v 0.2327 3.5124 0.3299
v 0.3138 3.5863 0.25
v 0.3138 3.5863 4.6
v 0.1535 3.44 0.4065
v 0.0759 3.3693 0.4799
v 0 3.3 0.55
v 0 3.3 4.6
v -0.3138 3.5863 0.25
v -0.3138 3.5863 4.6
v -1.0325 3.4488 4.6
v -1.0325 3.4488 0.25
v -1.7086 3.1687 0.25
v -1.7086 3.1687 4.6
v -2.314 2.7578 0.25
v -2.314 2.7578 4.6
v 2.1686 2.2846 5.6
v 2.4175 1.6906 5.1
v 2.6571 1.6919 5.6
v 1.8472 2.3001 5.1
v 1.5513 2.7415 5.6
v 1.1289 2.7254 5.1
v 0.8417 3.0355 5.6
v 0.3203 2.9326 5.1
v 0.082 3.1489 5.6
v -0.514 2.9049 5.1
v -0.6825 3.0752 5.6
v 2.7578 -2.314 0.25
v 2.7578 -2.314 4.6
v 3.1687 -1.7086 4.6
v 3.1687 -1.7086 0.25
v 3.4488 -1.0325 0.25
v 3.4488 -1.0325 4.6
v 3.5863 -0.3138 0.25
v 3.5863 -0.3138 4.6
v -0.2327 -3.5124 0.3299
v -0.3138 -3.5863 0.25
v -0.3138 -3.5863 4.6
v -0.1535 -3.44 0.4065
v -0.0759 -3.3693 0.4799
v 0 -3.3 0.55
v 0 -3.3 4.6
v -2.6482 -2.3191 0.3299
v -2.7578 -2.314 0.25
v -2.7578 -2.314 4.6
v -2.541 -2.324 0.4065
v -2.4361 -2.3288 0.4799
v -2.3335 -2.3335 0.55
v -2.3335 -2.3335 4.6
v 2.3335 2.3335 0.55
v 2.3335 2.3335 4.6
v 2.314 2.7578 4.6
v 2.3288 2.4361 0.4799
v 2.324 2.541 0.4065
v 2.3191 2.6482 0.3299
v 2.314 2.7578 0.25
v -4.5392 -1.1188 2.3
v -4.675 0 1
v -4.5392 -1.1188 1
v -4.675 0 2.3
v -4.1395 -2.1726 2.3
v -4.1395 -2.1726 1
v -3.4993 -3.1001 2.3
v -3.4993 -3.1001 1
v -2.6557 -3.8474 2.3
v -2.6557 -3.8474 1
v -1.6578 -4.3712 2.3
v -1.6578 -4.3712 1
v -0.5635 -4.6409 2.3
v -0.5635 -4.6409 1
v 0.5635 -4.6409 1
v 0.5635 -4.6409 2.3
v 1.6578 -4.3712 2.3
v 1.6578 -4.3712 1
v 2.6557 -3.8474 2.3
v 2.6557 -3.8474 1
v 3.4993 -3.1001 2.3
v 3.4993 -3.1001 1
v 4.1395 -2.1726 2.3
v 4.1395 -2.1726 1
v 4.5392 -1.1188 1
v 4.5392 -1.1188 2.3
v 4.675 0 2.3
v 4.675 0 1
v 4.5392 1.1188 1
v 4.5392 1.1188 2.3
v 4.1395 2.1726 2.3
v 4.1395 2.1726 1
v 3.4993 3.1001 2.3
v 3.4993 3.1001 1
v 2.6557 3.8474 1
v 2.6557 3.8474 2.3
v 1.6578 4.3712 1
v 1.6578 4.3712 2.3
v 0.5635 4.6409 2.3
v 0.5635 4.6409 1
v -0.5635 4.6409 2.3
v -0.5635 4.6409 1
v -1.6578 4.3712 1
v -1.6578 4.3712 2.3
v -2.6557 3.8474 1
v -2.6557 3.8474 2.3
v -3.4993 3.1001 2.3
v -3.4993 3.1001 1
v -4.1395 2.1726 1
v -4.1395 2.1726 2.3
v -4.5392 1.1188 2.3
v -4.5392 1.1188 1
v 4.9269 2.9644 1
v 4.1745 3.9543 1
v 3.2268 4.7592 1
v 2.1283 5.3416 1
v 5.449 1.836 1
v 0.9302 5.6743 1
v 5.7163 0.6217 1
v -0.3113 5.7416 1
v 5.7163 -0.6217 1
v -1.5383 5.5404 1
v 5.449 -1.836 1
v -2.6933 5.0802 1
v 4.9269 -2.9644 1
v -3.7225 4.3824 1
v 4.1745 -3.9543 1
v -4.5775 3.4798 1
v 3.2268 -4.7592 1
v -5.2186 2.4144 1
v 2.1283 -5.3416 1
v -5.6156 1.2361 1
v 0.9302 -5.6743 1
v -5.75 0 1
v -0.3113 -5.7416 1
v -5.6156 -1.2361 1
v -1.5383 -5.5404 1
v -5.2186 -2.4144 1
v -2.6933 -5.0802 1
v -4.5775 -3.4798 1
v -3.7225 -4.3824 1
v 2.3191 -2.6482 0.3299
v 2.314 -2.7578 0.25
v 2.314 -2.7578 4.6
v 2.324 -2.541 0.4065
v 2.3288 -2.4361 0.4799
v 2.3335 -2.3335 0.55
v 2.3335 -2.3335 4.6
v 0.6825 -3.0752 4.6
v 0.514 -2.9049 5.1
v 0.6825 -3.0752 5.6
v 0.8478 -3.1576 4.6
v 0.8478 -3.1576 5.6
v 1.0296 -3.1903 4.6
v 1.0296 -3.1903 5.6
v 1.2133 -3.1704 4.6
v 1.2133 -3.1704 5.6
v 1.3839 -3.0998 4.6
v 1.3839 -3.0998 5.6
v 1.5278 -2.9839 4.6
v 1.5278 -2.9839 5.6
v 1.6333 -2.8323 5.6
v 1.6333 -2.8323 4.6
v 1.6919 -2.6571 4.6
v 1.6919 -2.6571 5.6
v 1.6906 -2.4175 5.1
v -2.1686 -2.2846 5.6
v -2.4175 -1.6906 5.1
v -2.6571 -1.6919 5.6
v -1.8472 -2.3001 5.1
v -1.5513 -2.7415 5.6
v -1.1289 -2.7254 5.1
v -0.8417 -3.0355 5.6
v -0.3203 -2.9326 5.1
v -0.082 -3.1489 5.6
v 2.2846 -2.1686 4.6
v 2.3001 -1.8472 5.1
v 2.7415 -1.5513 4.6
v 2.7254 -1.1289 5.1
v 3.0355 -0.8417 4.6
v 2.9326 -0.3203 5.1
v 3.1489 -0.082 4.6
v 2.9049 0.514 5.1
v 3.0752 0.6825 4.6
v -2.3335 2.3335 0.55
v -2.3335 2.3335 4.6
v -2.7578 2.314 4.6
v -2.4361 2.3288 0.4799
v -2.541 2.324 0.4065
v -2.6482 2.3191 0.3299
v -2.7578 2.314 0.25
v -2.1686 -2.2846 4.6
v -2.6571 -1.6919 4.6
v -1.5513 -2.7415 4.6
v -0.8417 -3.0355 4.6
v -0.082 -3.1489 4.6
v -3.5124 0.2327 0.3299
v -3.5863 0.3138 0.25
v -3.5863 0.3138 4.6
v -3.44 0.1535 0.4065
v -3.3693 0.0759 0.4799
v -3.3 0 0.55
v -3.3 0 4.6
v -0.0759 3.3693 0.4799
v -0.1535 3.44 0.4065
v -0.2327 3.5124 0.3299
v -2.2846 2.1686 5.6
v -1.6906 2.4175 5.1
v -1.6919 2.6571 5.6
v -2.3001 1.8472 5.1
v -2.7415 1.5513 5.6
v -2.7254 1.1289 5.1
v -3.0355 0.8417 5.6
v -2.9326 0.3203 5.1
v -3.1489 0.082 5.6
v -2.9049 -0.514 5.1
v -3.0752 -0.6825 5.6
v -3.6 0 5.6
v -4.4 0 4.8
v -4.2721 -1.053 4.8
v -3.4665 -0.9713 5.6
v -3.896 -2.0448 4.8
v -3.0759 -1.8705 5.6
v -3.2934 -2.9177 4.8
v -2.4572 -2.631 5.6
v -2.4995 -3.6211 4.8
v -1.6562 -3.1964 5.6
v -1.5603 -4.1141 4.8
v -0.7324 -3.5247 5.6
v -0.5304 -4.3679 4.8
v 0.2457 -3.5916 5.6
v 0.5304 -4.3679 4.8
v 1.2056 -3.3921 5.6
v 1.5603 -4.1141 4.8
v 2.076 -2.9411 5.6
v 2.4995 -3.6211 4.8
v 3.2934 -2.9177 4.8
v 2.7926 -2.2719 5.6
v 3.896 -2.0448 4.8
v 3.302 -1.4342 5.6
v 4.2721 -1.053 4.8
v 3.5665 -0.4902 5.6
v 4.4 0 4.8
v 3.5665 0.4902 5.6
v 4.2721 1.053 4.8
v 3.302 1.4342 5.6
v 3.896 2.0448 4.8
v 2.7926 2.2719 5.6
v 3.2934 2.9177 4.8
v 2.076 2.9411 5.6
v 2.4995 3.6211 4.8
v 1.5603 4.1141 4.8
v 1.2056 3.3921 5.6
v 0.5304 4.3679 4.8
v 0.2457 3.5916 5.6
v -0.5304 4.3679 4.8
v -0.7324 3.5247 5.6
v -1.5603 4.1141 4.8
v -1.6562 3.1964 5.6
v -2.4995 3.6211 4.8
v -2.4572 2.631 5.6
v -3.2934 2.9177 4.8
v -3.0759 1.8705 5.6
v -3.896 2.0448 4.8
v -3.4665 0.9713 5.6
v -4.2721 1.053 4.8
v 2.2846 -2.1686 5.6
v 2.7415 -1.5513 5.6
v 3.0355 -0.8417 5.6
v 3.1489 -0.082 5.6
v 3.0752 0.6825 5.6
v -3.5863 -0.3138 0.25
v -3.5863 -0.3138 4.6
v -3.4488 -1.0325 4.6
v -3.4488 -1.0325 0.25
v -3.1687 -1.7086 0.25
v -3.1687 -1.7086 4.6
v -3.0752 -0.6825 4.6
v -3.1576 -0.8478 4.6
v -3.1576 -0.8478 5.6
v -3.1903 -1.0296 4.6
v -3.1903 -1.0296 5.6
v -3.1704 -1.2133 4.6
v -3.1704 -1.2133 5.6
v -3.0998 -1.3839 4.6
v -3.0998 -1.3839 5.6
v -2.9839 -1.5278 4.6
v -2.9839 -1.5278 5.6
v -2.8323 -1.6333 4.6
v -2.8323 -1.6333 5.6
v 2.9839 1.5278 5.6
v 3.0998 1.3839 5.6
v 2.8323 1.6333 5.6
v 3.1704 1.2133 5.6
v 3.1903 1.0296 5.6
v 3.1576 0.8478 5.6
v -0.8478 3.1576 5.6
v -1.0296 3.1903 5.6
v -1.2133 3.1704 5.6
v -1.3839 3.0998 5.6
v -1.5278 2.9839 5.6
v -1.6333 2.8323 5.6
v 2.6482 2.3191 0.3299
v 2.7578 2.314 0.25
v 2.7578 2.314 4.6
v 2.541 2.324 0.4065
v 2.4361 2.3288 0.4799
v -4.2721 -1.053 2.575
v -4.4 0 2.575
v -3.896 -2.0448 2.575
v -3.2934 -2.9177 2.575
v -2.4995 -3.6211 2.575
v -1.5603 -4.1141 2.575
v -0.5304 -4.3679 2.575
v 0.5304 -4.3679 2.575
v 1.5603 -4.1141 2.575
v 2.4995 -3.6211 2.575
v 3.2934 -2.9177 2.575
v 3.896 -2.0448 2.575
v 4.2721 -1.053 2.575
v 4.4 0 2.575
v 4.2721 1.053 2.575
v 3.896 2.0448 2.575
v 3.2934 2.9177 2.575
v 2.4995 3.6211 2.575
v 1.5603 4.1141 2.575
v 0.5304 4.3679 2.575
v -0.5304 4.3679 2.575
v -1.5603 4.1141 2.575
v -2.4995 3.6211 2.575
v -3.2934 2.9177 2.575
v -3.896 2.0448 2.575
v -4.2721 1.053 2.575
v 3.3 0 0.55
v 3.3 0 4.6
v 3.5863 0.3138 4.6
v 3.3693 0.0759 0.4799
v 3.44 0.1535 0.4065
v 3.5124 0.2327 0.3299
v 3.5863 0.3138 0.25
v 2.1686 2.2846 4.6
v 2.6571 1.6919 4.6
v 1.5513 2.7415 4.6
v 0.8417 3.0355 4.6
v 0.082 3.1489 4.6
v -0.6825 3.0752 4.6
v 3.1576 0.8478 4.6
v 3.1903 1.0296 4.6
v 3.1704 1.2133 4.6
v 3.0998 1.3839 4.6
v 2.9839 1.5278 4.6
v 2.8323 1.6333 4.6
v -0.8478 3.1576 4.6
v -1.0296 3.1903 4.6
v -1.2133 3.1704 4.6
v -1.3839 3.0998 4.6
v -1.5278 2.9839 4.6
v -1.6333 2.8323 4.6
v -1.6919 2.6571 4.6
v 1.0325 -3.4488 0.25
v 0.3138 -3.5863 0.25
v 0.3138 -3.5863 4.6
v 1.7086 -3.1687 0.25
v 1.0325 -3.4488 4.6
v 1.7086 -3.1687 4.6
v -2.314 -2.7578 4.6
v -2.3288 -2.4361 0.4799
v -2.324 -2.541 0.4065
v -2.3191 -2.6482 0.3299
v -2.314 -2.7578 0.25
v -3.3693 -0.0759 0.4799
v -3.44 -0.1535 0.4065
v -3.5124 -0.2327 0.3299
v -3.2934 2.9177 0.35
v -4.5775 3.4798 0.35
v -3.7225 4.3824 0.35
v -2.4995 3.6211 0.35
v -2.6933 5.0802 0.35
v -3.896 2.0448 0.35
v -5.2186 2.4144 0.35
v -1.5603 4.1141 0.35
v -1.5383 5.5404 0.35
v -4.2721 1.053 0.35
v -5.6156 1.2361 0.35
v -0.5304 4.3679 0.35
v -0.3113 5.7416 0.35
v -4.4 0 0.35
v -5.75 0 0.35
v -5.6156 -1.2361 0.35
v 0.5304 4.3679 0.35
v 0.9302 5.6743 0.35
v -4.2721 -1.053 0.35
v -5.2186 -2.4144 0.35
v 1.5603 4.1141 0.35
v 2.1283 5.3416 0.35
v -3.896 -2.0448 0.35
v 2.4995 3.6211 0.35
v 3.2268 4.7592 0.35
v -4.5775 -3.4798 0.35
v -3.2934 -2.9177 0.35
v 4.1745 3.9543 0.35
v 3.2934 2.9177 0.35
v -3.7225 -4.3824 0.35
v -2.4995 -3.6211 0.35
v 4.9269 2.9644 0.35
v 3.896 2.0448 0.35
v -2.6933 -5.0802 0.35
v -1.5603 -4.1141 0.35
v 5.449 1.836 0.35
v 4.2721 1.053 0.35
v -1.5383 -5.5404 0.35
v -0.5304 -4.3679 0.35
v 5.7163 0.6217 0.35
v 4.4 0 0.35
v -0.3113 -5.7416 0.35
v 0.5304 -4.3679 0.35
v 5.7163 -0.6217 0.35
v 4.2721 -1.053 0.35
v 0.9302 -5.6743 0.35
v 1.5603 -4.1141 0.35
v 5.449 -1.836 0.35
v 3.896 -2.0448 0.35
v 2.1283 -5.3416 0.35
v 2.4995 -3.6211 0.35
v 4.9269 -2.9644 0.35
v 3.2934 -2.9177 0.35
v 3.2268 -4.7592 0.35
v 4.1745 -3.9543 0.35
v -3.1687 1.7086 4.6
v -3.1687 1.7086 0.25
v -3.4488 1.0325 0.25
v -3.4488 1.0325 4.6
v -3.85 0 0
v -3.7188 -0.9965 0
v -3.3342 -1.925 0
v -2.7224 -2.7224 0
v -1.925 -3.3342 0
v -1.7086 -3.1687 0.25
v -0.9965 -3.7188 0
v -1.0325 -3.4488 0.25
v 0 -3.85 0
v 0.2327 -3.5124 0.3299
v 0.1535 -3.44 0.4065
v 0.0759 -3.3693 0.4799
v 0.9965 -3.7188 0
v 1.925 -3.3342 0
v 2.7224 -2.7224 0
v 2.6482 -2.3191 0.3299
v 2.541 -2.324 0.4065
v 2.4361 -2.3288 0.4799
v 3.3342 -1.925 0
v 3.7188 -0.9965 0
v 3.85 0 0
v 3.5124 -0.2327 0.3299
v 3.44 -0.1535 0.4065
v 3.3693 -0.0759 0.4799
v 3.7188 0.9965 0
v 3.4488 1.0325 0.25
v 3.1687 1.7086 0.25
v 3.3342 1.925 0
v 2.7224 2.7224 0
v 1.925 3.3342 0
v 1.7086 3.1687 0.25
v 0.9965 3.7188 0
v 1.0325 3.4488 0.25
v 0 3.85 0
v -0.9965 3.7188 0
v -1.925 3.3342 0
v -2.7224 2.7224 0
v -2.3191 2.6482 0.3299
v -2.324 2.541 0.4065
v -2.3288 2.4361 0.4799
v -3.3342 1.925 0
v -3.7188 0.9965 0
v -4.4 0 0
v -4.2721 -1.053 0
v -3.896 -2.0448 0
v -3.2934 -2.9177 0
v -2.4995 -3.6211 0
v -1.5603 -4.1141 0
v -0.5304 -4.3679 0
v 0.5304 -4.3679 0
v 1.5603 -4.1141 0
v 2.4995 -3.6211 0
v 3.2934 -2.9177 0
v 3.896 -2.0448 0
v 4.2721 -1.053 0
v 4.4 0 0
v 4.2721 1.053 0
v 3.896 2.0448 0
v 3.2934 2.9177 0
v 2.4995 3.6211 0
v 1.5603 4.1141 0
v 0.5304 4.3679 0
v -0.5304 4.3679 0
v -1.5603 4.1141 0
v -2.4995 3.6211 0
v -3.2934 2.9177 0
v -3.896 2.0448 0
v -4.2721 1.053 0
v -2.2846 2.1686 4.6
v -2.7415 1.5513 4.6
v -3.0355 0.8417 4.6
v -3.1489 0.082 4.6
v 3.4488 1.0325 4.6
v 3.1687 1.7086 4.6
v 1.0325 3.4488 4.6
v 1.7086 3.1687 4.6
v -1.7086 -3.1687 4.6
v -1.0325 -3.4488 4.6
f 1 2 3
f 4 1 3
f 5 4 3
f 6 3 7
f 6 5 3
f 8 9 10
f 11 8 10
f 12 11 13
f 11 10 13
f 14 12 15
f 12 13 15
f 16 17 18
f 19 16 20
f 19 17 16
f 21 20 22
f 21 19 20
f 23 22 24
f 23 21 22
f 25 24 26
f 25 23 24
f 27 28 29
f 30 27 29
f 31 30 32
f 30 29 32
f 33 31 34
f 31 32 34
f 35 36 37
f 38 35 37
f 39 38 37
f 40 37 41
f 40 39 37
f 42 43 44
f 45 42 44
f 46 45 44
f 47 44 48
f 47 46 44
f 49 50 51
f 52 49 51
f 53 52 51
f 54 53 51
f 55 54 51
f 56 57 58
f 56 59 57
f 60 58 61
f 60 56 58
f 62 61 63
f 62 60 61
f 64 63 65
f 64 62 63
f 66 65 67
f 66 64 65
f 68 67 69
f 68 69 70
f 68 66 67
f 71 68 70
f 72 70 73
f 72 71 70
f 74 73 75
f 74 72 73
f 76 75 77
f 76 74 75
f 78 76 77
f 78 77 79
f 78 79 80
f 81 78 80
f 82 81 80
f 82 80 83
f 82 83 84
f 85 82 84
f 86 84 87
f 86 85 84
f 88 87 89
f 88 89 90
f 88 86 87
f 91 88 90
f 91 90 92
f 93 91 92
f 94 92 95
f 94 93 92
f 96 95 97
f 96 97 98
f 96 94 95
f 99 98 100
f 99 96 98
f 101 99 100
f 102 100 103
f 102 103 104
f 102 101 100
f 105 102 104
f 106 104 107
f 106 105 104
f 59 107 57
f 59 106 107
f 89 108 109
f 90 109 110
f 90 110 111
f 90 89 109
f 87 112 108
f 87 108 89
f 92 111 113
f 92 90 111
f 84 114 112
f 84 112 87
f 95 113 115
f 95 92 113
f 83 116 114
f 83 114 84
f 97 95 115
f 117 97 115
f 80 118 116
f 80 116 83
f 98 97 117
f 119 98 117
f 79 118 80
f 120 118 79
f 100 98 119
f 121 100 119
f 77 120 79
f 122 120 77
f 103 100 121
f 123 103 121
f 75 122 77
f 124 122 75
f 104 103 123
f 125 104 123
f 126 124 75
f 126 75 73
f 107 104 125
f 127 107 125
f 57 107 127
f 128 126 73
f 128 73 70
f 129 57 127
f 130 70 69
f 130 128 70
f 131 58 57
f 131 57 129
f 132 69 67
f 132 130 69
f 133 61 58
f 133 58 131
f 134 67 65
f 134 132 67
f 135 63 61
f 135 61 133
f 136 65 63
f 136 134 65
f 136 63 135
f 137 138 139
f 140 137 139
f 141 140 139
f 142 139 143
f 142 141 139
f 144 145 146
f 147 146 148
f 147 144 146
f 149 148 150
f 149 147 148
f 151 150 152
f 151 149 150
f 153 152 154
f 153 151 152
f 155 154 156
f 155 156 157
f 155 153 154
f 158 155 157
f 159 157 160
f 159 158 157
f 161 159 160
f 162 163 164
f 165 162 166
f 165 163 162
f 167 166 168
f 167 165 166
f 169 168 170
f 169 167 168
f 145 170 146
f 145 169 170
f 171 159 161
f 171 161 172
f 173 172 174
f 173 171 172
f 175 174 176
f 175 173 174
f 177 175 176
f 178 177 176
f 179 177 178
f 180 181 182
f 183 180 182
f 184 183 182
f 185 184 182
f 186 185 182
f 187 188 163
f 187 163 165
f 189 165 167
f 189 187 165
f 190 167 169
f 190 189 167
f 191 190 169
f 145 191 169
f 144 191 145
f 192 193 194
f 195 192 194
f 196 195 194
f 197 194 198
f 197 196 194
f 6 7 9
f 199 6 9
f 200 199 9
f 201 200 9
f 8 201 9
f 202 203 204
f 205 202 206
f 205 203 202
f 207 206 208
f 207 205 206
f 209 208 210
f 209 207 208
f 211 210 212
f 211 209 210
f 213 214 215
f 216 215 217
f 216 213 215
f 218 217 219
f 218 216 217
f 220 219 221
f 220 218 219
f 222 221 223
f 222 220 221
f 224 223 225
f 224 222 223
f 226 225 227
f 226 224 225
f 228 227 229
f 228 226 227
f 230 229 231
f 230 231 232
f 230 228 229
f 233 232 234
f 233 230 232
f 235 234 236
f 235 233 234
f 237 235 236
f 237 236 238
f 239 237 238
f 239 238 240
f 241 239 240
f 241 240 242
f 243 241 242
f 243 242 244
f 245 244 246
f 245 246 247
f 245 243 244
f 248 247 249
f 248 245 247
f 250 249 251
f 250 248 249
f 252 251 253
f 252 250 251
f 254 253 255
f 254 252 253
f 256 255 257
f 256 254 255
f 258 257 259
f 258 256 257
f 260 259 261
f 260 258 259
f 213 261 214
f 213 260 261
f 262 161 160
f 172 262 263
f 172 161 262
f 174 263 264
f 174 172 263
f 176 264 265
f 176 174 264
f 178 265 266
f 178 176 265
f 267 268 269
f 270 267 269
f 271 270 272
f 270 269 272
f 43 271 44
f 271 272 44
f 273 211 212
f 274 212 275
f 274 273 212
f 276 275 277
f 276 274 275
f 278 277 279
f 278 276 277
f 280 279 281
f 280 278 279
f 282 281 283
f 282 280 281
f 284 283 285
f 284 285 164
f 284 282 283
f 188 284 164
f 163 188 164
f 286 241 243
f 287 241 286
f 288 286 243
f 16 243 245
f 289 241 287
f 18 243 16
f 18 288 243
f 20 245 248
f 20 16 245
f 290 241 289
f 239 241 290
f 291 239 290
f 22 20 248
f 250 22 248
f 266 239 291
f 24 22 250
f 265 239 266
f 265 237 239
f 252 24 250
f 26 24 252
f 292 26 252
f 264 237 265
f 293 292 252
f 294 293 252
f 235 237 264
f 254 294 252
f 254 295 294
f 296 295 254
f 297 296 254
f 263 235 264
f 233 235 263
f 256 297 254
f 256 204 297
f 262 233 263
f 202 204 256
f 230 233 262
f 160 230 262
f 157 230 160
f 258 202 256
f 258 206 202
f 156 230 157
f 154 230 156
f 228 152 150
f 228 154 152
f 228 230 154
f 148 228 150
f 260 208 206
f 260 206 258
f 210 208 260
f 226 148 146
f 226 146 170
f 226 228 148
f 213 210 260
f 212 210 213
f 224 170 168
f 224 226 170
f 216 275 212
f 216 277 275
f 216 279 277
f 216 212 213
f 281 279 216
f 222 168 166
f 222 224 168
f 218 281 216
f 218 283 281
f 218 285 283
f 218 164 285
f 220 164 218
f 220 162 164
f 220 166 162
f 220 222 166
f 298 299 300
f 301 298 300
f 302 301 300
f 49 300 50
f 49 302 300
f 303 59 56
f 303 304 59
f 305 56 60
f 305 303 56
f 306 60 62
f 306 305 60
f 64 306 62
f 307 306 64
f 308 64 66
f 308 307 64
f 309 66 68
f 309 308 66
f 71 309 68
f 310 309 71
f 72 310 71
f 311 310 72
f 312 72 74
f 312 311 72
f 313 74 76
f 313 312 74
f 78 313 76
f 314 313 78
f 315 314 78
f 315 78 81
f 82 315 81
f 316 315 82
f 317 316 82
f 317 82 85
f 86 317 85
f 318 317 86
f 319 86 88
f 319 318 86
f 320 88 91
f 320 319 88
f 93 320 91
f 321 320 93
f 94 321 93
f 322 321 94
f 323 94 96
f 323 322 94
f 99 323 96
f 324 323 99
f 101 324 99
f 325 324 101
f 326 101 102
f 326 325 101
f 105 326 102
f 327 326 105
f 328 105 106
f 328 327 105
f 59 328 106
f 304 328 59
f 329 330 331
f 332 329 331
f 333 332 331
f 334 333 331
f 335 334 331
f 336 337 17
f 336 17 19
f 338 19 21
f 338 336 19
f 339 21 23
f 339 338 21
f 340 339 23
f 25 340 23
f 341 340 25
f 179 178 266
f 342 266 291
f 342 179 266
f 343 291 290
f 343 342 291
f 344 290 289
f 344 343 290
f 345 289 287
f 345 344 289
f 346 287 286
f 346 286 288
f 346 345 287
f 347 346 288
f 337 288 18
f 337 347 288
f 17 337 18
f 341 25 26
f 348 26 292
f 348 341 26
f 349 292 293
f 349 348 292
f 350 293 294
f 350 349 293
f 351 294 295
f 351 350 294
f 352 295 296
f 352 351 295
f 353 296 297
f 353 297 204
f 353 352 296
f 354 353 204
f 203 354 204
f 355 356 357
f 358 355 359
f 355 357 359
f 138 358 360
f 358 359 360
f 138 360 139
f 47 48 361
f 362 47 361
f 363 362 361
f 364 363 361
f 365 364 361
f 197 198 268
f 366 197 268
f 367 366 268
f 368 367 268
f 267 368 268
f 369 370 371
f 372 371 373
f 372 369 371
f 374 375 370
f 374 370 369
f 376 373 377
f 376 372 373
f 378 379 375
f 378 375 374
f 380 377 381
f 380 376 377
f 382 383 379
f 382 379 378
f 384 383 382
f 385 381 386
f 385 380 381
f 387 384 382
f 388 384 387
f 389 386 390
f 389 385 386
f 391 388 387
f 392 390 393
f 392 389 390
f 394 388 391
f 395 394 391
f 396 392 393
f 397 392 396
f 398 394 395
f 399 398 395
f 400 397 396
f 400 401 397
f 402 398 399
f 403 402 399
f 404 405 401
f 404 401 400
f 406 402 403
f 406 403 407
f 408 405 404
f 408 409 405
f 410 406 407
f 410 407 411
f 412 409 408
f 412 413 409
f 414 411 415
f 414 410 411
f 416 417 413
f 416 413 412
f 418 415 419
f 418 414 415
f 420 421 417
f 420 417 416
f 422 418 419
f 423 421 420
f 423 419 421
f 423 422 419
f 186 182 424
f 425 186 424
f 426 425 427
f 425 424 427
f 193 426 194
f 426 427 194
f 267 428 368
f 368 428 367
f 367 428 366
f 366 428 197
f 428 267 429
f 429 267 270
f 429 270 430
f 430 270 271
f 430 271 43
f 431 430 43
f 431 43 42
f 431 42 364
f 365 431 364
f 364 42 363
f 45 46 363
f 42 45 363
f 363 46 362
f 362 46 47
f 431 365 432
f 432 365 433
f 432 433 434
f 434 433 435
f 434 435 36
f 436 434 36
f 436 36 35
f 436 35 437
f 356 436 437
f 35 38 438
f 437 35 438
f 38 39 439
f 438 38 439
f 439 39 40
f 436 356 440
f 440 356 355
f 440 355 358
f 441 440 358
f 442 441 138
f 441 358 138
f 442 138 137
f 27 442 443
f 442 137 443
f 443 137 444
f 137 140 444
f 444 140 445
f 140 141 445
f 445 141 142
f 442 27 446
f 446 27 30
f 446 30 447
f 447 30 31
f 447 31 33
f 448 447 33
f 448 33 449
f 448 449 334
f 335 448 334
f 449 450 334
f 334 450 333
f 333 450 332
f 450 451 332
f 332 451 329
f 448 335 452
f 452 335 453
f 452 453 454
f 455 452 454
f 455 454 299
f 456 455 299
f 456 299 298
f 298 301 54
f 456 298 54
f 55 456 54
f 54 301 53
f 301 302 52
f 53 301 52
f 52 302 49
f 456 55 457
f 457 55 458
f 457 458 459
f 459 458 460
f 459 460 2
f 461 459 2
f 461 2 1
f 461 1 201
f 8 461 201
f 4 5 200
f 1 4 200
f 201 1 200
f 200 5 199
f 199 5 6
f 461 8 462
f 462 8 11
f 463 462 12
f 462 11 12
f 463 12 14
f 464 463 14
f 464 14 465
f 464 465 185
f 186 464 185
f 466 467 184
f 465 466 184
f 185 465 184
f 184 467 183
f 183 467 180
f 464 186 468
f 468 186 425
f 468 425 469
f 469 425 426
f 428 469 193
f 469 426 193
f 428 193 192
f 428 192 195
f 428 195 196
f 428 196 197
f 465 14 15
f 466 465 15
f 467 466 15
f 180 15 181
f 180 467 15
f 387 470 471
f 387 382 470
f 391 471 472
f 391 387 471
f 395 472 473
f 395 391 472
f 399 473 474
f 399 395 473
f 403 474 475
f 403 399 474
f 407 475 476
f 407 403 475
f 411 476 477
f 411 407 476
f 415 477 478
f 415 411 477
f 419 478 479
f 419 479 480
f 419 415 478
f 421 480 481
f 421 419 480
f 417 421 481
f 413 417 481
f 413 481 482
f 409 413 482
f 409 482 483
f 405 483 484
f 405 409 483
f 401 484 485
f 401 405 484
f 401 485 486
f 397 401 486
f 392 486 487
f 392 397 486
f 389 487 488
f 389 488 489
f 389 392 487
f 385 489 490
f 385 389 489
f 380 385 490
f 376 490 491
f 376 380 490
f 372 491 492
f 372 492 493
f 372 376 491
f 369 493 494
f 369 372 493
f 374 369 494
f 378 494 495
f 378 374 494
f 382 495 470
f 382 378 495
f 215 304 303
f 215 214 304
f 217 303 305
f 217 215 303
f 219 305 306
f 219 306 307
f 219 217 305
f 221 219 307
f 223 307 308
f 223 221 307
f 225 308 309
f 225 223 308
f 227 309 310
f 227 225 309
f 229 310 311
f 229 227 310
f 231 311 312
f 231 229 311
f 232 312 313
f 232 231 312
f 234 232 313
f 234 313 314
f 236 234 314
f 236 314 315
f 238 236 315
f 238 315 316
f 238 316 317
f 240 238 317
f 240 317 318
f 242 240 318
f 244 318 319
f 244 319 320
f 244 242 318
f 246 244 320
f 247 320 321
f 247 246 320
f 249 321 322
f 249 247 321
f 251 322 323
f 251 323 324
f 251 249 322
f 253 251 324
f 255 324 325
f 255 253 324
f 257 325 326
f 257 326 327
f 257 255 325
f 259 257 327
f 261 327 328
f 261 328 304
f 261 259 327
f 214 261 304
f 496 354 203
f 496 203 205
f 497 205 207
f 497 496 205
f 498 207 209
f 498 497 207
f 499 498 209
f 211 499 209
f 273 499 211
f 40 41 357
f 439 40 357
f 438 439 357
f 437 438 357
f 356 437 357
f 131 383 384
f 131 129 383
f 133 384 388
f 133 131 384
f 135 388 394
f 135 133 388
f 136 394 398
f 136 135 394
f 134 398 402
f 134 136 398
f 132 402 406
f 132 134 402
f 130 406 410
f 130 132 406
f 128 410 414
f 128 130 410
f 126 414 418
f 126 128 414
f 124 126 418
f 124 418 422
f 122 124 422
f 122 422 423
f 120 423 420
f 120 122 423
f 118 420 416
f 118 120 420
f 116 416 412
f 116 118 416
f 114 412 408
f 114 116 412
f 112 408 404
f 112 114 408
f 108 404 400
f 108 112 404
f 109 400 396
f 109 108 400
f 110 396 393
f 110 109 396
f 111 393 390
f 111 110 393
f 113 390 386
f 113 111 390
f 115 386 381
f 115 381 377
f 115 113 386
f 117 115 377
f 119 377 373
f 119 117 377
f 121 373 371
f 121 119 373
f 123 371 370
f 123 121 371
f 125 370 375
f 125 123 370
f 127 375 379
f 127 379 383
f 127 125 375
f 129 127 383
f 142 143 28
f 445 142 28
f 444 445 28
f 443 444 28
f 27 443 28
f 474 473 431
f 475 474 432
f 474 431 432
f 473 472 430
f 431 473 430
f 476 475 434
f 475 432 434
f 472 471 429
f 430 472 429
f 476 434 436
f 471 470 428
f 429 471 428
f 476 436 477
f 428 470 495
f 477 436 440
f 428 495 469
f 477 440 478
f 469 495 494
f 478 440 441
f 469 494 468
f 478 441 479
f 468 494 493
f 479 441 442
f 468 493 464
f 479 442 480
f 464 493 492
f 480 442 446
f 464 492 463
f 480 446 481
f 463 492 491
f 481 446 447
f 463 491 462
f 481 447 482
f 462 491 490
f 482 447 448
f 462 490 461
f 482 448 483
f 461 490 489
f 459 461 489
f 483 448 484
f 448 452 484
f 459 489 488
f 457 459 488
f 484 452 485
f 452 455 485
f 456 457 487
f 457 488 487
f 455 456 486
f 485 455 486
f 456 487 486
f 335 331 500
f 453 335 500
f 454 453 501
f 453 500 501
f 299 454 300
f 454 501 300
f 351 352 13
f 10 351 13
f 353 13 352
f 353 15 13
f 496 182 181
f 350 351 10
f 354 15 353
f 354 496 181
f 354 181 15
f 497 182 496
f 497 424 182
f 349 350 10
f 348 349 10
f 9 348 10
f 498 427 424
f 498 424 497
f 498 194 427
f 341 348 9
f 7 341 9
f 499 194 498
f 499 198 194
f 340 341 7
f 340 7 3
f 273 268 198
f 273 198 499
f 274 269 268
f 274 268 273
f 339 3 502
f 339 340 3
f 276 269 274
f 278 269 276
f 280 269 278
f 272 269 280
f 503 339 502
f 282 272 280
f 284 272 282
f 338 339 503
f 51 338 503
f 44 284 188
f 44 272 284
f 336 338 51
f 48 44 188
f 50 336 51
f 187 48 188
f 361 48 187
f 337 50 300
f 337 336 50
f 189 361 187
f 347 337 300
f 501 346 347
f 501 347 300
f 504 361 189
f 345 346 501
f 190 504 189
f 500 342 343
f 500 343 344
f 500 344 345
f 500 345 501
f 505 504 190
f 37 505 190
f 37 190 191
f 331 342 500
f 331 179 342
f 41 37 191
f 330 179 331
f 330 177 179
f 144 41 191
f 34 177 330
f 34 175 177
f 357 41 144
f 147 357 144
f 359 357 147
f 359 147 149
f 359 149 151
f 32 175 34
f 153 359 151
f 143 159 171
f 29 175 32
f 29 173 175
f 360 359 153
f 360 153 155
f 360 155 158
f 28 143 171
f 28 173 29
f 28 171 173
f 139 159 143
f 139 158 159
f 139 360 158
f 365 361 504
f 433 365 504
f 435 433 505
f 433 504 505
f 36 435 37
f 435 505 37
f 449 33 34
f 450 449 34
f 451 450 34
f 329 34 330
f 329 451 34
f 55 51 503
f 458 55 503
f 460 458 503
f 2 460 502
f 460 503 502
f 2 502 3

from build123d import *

# Parameters (mm, degrees)
PAD_DEPTH             = 4.6
POLARPATTERN004_COUNT = 8
SKETCH010_R           = 0.65
POCKET001_DEPTH       = 40.002163
POLARPATTERN005_COUNT = 4


with BuildPart() as part:
    # Sketch007 → Revolution005 (revolve)
    with BuildSketch(Plane.XZ):
        Polygon((-3.6, 4.6), (-3.6, 3.5), (-3.6, 2.5), (-3.6, 1), (-3.6, 0), (-4.4, 0), (-4.4, 0.35), (-5.75, 0.35), (-5.75, 1), (-4.675, 1), (-4.675, 2.3), (-4.4, 2.575), (-4.4, 4.8), (-3.6, 5.6), (-3.15, 5.6), (-2.95, 5.1), (-3.15, 4.6), align=None)
    revolve(axis=Axis((0, 0, 0), (0, 0, 1)))

    # Sketch008 → Pad (new body)
    with BuildSketch(Plane.XY):
        with BuildLine():
            ThreePointArc((-3.586301, 0.313761), (-3.6, 0), (-3.586301, -0.313761))
            Line((-3.3, 0), (-3.586301, -0.313761))
            Line((-3.586301, 0.313761), (-3.3, 0))
        make_face()
    pad = extrude(amount=PAD_DEPTH)

    # PolarPattern004: Pad ×8 about axis
    polarpattern004_axis = Axis((0, 0, 0), (0, 0, 1))
    for i in range(1, POLARPATTERN004_COUNT):
        add(pad.rotate(polarpattern004_axis, i * 360 / POLARPATTERN004_COUNT))

    # Sketch009 → Groove (revolve, cut)
    with BuildSketch(Plane.XZ):
        Polygon((-3.85, 0), (0, 3.85), (0, 0), align=None)
    revolve(axis=Axis((0, 0, 0), (0, 0, 1)), mode=Mode.SUBTRACT)

    # Sketch010 → Pocket001 (cut, through all)
    with BuildSketch(Plane.XY):
        with Locations((2.540669, 1.052379)):
            Circle(SKETCH010_R)
    pocket001 = extrude(amount=POCKET001_DEPTH, mode=Mode.SUBTRACT)

    # PolarPattern005: Pocket001 ×4 about axis
    polarpattern005_axis = Axis((0, 0, 0), (0, 0, 1))
    for i in range(1, POLARPATTERN005_COUNT):
        add(pocket001.rotate(polarpattern005_axis, i * 360 / POLARPATTERN005_COUNT), mode=Mode.SUBTRACT)


solid = part.part
